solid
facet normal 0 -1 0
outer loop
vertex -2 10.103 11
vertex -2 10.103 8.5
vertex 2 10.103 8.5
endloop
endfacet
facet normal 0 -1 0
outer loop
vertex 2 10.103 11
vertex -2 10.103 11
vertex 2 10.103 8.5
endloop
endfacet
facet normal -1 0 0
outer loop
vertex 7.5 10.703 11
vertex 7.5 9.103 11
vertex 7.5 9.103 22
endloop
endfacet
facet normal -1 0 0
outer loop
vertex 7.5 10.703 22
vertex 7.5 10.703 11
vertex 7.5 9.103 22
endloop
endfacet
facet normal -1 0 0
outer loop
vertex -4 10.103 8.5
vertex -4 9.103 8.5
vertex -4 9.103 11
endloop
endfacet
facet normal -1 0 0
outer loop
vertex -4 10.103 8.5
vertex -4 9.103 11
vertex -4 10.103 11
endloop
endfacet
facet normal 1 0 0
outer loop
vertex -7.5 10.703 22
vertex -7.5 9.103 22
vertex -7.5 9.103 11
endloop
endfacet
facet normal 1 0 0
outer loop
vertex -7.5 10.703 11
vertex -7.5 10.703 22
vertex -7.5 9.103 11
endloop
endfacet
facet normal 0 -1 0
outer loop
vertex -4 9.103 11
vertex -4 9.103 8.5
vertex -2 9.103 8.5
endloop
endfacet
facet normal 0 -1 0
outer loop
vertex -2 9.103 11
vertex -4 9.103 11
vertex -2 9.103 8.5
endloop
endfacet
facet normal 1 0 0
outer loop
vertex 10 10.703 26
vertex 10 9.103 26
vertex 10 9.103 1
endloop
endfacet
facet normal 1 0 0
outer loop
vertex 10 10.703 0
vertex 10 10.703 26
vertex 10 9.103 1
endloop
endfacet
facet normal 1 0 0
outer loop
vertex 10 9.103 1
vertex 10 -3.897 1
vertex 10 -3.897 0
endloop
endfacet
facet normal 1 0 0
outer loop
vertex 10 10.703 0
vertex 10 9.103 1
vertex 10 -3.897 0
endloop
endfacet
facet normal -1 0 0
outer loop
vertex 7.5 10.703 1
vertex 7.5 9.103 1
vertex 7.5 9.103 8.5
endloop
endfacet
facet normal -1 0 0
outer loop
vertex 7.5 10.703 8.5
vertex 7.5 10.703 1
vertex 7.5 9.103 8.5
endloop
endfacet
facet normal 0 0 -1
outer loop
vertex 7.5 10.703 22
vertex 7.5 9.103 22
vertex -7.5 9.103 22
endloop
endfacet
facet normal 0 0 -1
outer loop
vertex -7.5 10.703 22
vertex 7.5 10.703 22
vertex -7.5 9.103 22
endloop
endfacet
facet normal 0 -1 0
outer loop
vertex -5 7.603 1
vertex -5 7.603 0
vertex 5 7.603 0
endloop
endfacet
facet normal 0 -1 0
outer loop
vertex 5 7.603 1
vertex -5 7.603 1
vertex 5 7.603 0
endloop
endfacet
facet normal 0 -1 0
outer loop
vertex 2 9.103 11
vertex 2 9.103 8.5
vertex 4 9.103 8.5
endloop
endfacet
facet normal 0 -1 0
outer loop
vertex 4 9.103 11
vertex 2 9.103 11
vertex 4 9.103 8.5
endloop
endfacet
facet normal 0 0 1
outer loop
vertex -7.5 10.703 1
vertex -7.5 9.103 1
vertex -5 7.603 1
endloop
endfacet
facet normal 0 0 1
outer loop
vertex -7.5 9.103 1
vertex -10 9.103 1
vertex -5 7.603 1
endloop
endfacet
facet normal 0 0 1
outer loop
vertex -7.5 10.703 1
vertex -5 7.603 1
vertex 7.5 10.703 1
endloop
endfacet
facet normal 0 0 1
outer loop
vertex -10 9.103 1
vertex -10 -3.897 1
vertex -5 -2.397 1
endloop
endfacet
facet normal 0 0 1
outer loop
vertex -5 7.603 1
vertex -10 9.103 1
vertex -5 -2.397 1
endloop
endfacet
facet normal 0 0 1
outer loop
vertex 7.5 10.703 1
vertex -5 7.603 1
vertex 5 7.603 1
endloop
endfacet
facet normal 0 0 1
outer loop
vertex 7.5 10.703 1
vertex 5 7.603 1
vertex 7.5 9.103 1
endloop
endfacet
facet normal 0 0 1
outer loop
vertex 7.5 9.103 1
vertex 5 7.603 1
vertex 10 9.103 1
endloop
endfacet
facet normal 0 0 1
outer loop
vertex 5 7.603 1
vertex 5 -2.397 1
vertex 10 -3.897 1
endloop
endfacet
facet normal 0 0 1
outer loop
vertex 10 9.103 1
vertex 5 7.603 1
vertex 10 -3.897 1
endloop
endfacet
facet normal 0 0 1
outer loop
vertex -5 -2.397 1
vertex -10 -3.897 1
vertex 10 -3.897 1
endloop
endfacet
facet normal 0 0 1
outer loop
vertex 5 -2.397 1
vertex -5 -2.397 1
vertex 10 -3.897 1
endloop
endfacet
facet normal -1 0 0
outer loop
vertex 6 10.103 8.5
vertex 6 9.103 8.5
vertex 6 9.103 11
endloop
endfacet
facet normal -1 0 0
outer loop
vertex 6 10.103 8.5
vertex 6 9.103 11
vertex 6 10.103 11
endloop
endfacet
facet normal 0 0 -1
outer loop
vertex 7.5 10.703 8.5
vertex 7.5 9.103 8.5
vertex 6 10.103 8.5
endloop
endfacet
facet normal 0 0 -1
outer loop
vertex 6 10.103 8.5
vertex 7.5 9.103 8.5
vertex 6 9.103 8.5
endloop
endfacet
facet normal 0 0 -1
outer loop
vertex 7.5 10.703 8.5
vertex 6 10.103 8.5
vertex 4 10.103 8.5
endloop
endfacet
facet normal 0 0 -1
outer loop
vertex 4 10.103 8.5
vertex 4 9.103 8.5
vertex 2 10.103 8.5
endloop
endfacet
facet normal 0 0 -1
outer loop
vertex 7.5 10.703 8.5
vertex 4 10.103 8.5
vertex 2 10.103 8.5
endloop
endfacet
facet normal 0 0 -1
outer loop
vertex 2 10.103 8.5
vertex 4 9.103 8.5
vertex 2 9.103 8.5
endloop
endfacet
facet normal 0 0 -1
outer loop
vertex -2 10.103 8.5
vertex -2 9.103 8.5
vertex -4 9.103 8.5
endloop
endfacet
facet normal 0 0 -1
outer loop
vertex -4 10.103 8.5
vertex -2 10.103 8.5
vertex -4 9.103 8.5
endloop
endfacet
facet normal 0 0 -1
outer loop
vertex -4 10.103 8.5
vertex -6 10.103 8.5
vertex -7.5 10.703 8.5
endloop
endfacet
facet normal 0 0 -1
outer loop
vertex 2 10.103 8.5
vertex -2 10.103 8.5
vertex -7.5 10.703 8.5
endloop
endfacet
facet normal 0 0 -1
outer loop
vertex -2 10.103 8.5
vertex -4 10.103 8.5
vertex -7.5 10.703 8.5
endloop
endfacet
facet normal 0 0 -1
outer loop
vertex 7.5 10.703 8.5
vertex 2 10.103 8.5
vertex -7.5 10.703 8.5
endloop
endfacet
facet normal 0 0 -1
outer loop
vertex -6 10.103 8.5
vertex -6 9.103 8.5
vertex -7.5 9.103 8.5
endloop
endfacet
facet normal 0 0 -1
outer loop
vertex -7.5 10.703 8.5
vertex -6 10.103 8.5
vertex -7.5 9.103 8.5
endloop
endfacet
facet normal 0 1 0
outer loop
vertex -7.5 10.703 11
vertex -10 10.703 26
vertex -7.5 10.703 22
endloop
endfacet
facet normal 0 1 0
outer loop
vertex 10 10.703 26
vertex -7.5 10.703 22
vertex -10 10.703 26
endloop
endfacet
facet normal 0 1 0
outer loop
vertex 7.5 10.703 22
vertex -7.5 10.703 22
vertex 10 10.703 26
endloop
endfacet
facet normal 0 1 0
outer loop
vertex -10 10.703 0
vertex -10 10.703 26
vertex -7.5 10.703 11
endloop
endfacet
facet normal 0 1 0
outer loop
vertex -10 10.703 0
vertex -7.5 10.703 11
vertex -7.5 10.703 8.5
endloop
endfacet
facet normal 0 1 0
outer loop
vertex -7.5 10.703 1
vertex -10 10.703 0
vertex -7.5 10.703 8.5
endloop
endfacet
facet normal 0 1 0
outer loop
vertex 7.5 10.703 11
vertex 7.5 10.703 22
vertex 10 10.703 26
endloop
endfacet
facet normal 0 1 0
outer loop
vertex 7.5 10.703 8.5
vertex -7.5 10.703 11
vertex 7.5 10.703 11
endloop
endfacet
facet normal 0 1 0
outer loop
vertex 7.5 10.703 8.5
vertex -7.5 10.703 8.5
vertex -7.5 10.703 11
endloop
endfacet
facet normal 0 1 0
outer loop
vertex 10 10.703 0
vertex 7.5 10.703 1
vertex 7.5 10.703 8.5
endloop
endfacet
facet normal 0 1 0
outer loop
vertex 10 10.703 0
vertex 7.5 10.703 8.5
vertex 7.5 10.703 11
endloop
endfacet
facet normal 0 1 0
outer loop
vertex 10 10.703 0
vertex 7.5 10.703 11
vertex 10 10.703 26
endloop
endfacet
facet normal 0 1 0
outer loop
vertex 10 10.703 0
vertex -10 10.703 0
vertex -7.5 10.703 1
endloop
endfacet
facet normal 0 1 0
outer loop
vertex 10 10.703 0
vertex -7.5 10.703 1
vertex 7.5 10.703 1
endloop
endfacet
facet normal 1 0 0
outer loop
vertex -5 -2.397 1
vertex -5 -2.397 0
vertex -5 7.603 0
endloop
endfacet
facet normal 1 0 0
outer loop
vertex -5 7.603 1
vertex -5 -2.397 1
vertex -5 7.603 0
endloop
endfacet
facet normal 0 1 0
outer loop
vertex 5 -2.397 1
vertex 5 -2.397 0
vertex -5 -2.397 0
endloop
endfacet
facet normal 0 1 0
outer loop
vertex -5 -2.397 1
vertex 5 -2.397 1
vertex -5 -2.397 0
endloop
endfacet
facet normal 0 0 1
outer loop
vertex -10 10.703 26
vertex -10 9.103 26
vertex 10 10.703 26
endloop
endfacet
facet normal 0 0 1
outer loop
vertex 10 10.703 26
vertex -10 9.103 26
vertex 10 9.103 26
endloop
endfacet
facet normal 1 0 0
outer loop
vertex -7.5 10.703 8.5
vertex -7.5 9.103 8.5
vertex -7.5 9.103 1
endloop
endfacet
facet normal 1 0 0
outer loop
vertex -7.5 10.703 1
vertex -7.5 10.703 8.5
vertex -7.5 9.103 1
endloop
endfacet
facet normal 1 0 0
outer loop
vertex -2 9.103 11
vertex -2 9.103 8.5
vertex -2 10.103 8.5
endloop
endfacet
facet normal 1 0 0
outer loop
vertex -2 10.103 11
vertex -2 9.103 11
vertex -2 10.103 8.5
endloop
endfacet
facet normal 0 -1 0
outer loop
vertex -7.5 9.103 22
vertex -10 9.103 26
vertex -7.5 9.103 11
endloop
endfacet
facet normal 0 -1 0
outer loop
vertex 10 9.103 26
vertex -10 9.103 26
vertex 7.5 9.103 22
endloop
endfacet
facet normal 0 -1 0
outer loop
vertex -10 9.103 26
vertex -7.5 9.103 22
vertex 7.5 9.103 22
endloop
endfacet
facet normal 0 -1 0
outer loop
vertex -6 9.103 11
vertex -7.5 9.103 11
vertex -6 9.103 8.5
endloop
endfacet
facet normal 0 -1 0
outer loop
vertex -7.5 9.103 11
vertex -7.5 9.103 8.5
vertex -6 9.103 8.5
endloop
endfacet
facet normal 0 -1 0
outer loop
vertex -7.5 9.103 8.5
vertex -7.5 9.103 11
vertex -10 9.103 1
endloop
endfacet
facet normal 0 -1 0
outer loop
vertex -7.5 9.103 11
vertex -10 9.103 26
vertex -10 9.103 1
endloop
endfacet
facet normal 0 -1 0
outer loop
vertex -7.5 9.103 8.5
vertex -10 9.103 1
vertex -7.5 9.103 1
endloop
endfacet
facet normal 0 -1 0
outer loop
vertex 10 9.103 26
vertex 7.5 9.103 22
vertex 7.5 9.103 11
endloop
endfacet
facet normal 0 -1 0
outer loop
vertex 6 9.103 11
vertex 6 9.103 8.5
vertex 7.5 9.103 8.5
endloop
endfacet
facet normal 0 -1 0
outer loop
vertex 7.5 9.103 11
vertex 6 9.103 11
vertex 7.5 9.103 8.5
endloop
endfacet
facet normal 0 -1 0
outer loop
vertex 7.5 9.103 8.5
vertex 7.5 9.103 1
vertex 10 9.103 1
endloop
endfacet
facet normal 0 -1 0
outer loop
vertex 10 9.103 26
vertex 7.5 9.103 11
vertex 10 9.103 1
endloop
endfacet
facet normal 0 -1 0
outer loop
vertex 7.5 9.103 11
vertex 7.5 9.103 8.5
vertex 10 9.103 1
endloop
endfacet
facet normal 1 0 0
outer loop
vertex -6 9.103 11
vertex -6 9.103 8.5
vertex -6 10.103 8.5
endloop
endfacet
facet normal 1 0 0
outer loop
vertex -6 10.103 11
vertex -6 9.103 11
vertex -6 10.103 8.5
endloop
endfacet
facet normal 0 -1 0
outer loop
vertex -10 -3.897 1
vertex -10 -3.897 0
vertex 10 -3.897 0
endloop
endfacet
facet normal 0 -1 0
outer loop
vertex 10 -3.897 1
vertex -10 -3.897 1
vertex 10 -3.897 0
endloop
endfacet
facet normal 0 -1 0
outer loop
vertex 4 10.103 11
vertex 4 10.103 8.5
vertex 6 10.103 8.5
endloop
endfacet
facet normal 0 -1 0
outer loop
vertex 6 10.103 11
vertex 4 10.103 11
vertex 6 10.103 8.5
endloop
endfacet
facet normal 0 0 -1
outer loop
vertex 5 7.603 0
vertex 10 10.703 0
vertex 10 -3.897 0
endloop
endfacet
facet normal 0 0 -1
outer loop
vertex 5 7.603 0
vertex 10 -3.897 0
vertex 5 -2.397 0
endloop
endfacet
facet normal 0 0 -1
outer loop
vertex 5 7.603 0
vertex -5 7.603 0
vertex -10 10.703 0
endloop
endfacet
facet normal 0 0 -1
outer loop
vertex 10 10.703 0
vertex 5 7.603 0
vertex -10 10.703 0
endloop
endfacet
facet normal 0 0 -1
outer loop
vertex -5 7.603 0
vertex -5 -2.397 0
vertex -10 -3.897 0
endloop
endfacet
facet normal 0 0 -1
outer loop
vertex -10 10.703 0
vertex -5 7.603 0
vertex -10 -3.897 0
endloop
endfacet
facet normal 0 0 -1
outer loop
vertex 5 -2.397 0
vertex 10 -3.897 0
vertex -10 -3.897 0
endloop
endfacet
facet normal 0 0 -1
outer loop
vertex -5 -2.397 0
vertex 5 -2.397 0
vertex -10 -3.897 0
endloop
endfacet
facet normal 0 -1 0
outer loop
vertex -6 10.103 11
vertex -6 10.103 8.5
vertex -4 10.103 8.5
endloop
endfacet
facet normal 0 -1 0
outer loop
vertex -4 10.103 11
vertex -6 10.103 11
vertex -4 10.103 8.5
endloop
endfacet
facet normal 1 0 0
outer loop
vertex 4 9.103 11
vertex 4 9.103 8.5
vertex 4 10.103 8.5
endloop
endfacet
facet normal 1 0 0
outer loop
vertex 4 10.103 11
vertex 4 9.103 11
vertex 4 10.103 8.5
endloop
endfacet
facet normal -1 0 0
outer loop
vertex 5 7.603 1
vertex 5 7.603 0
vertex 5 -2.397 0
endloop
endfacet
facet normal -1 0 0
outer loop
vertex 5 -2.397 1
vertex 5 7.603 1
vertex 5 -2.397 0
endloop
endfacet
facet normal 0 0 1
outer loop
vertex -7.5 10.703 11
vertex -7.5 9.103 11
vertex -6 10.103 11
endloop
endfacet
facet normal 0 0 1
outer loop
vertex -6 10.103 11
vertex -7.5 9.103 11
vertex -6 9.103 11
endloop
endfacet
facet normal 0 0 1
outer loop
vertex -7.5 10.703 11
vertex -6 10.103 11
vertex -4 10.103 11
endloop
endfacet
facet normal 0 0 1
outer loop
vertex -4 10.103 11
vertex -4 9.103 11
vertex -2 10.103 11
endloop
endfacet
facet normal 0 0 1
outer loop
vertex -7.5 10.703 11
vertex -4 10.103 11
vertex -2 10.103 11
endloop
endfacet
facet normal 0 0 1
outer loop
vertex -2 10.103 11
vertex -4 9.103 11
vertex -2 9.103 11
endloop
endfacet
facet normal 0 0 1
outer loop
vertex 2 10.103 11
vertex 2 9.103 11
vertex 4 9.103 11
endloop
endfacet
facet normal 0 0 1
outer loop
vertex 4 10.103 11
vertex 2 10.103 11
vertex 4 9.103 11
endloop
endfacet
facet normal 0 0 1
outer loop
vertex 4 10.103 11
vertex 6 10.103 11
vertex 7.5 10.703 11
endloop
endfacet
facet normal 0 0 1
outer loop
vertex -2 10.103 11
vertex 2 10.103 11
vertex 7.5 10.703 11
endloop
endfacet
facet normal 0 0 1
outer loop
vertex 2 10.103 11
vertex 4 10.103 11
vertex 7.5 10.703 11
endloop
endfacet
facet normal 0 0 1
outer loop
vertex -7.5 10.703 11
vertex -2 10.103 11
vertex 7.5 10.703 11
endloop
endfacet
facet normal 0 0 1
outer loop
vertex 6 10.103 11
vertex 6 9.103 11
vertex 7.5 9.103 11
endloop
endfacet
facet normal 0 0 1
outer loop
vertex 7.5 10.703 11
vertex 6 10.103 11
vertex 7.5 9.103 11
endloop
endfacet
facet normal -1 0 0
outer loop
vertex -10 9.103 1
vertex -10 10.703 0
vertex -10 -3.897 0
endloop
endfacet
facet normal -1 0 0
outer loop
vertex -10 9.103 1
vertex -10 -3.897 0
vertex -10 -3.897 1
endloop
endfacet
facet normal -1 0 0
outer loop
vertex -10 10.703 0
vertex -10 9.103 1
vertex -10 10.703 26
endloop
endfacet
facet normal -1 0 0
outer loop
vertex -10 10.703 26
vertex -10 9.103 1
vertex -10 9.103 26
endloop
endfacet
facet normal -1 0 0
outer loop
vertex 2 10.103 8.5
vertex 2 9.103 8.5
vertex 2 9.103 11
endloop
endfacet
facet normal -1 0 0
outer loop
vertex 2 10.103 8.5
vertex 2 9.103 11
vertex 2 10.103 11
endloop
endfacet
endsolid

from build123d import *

# Parameters (mm, degrees)
SKETCH_3_W          = 10
SKETCH_3_H          = 1.5
EXTRUDE_1_DEPTH     = 1
EXTRUDE_2_DEPTH     = 1.6
CUT_EXTRUDE_1_REACH = 30.975
SKETCH_6_W          = 2
SKETCH_6_H          = 1
SKETCH_6_W_2        = 4


with BuildPart() as part:
    # 草图3 → 凸台-拉伸1 (new body)
    with BuildSketch(Plane.XY):
        Polygon((5, 7.602908894), (5, -2.397091106), (-5, -2.397091106), (-5, 7.602908894), (-5, 9.102908894), (-10, 9.102908894), (-10, -3.897091106), (10, -3.897091106), (10, 9.102908894), (5, 9.102908894), align=None)
        with Locations((0, 8.352908894)):
            Rectangle(SKETCH_3_W, SKETCH_3_H)
    extrude(amount=EXTRUDE_1_DEPTH)

    # 草图4 → 凸台-拉伸2 (add)
    with BuildSketch(Plane(origin=(0, 9.102908894, 0), x_dir=(1, 0, 0), z_dir=(0, 1, 0))):
        Polygon((10, -1), (10, 0), (0, 0), (0, -1), (7.5, -1), align=None)
        Polygon((0, -1), (0, 0), (-10, 0), (-10, -1), (-7.5, -1), align=None)
        Polygon((-7.5, -1), (-10, -1), (-10, -26), (0, -26), (0, -22), (-7.5, -22), (-7.5, -11), (0, -11), (0, -8.5), (-7.5, -8.5), align=None)
        Polygon((10, -26), (10, -1), (7.5, -1), (7.5, -8.5), (0, -8.5), (0, -11), (7.5, -11), (7.5, -22), (0, -22), (0, -26), align=None)
    extrude(amount=EXTRUDE_2_DEPTH)

    # 草图6 → 切除-拉伸1 (cut, up to next)
    with BuildSketch(Plane.XY.offset(1), mode=Mode.PRIVATE) as cut_extrude_1_sk1:
        with Locations((-5, 9.602908894)):
            Rectangle(SKETCH_6_W, SKETCH_6_H)
    cut_extrude_1_tool1 = extrude(cut_extrude_1_sk1.sketch, amount=CUT_EXTRUDE_1_REACH, mode=Mode.PRIVATE) & part.part
    # 草图6 → 切除-拉伸1 (cut, up to next)
    with BuildSketch(Plane.XY.offset(1), mode=Mode.PRIVATE) as cut_extrude_1_sk2:
        with Locations((5, 9.602908894)):
            Rectangle(SKETCH_6_W, SKETCH_6_H)
    cut_extrude_1_tool2 = extrude(cut_extrude_1_sk2.sketch, amount=CUT_EXTRUDE_1_REACH, mode=Mode.PRIVATE) & part.part
    # 草图6 → 切除-拉伸1 (cut, up to next)
    with BuildSketch(Plane.XY.offset(1), mode=Mode.PRIVATE) as cut_extrude_1_sk3:
        with Locations((0, 9.602908894)):
            Rectangle(SKETCH_6_W_2, SKETCH_6_H)
    cut_extrude_1_tool3 = extrude(cut_extrude_1_sk3.sketch, amount=CUT_EXTRUDE_1_REACH, mode=Mode.PRIVATE) & part.part
    add(cut_extrude_1_tool1.solids().sort_by_distance((-5, 9.602909, 1))[0], mode=Mode.SUBTRACT)
    add(cut_extrude_1_tool2.solids().sort_by_distance((5, 9.602909, 1))[0], mode=Mode.SUBTRACT)
    add(cut_extrude_1_tool3.solids().sort_by_distance((0, 9.602909, 1))[0], mode=Mode.SUBTRACT)


solid = part.part
